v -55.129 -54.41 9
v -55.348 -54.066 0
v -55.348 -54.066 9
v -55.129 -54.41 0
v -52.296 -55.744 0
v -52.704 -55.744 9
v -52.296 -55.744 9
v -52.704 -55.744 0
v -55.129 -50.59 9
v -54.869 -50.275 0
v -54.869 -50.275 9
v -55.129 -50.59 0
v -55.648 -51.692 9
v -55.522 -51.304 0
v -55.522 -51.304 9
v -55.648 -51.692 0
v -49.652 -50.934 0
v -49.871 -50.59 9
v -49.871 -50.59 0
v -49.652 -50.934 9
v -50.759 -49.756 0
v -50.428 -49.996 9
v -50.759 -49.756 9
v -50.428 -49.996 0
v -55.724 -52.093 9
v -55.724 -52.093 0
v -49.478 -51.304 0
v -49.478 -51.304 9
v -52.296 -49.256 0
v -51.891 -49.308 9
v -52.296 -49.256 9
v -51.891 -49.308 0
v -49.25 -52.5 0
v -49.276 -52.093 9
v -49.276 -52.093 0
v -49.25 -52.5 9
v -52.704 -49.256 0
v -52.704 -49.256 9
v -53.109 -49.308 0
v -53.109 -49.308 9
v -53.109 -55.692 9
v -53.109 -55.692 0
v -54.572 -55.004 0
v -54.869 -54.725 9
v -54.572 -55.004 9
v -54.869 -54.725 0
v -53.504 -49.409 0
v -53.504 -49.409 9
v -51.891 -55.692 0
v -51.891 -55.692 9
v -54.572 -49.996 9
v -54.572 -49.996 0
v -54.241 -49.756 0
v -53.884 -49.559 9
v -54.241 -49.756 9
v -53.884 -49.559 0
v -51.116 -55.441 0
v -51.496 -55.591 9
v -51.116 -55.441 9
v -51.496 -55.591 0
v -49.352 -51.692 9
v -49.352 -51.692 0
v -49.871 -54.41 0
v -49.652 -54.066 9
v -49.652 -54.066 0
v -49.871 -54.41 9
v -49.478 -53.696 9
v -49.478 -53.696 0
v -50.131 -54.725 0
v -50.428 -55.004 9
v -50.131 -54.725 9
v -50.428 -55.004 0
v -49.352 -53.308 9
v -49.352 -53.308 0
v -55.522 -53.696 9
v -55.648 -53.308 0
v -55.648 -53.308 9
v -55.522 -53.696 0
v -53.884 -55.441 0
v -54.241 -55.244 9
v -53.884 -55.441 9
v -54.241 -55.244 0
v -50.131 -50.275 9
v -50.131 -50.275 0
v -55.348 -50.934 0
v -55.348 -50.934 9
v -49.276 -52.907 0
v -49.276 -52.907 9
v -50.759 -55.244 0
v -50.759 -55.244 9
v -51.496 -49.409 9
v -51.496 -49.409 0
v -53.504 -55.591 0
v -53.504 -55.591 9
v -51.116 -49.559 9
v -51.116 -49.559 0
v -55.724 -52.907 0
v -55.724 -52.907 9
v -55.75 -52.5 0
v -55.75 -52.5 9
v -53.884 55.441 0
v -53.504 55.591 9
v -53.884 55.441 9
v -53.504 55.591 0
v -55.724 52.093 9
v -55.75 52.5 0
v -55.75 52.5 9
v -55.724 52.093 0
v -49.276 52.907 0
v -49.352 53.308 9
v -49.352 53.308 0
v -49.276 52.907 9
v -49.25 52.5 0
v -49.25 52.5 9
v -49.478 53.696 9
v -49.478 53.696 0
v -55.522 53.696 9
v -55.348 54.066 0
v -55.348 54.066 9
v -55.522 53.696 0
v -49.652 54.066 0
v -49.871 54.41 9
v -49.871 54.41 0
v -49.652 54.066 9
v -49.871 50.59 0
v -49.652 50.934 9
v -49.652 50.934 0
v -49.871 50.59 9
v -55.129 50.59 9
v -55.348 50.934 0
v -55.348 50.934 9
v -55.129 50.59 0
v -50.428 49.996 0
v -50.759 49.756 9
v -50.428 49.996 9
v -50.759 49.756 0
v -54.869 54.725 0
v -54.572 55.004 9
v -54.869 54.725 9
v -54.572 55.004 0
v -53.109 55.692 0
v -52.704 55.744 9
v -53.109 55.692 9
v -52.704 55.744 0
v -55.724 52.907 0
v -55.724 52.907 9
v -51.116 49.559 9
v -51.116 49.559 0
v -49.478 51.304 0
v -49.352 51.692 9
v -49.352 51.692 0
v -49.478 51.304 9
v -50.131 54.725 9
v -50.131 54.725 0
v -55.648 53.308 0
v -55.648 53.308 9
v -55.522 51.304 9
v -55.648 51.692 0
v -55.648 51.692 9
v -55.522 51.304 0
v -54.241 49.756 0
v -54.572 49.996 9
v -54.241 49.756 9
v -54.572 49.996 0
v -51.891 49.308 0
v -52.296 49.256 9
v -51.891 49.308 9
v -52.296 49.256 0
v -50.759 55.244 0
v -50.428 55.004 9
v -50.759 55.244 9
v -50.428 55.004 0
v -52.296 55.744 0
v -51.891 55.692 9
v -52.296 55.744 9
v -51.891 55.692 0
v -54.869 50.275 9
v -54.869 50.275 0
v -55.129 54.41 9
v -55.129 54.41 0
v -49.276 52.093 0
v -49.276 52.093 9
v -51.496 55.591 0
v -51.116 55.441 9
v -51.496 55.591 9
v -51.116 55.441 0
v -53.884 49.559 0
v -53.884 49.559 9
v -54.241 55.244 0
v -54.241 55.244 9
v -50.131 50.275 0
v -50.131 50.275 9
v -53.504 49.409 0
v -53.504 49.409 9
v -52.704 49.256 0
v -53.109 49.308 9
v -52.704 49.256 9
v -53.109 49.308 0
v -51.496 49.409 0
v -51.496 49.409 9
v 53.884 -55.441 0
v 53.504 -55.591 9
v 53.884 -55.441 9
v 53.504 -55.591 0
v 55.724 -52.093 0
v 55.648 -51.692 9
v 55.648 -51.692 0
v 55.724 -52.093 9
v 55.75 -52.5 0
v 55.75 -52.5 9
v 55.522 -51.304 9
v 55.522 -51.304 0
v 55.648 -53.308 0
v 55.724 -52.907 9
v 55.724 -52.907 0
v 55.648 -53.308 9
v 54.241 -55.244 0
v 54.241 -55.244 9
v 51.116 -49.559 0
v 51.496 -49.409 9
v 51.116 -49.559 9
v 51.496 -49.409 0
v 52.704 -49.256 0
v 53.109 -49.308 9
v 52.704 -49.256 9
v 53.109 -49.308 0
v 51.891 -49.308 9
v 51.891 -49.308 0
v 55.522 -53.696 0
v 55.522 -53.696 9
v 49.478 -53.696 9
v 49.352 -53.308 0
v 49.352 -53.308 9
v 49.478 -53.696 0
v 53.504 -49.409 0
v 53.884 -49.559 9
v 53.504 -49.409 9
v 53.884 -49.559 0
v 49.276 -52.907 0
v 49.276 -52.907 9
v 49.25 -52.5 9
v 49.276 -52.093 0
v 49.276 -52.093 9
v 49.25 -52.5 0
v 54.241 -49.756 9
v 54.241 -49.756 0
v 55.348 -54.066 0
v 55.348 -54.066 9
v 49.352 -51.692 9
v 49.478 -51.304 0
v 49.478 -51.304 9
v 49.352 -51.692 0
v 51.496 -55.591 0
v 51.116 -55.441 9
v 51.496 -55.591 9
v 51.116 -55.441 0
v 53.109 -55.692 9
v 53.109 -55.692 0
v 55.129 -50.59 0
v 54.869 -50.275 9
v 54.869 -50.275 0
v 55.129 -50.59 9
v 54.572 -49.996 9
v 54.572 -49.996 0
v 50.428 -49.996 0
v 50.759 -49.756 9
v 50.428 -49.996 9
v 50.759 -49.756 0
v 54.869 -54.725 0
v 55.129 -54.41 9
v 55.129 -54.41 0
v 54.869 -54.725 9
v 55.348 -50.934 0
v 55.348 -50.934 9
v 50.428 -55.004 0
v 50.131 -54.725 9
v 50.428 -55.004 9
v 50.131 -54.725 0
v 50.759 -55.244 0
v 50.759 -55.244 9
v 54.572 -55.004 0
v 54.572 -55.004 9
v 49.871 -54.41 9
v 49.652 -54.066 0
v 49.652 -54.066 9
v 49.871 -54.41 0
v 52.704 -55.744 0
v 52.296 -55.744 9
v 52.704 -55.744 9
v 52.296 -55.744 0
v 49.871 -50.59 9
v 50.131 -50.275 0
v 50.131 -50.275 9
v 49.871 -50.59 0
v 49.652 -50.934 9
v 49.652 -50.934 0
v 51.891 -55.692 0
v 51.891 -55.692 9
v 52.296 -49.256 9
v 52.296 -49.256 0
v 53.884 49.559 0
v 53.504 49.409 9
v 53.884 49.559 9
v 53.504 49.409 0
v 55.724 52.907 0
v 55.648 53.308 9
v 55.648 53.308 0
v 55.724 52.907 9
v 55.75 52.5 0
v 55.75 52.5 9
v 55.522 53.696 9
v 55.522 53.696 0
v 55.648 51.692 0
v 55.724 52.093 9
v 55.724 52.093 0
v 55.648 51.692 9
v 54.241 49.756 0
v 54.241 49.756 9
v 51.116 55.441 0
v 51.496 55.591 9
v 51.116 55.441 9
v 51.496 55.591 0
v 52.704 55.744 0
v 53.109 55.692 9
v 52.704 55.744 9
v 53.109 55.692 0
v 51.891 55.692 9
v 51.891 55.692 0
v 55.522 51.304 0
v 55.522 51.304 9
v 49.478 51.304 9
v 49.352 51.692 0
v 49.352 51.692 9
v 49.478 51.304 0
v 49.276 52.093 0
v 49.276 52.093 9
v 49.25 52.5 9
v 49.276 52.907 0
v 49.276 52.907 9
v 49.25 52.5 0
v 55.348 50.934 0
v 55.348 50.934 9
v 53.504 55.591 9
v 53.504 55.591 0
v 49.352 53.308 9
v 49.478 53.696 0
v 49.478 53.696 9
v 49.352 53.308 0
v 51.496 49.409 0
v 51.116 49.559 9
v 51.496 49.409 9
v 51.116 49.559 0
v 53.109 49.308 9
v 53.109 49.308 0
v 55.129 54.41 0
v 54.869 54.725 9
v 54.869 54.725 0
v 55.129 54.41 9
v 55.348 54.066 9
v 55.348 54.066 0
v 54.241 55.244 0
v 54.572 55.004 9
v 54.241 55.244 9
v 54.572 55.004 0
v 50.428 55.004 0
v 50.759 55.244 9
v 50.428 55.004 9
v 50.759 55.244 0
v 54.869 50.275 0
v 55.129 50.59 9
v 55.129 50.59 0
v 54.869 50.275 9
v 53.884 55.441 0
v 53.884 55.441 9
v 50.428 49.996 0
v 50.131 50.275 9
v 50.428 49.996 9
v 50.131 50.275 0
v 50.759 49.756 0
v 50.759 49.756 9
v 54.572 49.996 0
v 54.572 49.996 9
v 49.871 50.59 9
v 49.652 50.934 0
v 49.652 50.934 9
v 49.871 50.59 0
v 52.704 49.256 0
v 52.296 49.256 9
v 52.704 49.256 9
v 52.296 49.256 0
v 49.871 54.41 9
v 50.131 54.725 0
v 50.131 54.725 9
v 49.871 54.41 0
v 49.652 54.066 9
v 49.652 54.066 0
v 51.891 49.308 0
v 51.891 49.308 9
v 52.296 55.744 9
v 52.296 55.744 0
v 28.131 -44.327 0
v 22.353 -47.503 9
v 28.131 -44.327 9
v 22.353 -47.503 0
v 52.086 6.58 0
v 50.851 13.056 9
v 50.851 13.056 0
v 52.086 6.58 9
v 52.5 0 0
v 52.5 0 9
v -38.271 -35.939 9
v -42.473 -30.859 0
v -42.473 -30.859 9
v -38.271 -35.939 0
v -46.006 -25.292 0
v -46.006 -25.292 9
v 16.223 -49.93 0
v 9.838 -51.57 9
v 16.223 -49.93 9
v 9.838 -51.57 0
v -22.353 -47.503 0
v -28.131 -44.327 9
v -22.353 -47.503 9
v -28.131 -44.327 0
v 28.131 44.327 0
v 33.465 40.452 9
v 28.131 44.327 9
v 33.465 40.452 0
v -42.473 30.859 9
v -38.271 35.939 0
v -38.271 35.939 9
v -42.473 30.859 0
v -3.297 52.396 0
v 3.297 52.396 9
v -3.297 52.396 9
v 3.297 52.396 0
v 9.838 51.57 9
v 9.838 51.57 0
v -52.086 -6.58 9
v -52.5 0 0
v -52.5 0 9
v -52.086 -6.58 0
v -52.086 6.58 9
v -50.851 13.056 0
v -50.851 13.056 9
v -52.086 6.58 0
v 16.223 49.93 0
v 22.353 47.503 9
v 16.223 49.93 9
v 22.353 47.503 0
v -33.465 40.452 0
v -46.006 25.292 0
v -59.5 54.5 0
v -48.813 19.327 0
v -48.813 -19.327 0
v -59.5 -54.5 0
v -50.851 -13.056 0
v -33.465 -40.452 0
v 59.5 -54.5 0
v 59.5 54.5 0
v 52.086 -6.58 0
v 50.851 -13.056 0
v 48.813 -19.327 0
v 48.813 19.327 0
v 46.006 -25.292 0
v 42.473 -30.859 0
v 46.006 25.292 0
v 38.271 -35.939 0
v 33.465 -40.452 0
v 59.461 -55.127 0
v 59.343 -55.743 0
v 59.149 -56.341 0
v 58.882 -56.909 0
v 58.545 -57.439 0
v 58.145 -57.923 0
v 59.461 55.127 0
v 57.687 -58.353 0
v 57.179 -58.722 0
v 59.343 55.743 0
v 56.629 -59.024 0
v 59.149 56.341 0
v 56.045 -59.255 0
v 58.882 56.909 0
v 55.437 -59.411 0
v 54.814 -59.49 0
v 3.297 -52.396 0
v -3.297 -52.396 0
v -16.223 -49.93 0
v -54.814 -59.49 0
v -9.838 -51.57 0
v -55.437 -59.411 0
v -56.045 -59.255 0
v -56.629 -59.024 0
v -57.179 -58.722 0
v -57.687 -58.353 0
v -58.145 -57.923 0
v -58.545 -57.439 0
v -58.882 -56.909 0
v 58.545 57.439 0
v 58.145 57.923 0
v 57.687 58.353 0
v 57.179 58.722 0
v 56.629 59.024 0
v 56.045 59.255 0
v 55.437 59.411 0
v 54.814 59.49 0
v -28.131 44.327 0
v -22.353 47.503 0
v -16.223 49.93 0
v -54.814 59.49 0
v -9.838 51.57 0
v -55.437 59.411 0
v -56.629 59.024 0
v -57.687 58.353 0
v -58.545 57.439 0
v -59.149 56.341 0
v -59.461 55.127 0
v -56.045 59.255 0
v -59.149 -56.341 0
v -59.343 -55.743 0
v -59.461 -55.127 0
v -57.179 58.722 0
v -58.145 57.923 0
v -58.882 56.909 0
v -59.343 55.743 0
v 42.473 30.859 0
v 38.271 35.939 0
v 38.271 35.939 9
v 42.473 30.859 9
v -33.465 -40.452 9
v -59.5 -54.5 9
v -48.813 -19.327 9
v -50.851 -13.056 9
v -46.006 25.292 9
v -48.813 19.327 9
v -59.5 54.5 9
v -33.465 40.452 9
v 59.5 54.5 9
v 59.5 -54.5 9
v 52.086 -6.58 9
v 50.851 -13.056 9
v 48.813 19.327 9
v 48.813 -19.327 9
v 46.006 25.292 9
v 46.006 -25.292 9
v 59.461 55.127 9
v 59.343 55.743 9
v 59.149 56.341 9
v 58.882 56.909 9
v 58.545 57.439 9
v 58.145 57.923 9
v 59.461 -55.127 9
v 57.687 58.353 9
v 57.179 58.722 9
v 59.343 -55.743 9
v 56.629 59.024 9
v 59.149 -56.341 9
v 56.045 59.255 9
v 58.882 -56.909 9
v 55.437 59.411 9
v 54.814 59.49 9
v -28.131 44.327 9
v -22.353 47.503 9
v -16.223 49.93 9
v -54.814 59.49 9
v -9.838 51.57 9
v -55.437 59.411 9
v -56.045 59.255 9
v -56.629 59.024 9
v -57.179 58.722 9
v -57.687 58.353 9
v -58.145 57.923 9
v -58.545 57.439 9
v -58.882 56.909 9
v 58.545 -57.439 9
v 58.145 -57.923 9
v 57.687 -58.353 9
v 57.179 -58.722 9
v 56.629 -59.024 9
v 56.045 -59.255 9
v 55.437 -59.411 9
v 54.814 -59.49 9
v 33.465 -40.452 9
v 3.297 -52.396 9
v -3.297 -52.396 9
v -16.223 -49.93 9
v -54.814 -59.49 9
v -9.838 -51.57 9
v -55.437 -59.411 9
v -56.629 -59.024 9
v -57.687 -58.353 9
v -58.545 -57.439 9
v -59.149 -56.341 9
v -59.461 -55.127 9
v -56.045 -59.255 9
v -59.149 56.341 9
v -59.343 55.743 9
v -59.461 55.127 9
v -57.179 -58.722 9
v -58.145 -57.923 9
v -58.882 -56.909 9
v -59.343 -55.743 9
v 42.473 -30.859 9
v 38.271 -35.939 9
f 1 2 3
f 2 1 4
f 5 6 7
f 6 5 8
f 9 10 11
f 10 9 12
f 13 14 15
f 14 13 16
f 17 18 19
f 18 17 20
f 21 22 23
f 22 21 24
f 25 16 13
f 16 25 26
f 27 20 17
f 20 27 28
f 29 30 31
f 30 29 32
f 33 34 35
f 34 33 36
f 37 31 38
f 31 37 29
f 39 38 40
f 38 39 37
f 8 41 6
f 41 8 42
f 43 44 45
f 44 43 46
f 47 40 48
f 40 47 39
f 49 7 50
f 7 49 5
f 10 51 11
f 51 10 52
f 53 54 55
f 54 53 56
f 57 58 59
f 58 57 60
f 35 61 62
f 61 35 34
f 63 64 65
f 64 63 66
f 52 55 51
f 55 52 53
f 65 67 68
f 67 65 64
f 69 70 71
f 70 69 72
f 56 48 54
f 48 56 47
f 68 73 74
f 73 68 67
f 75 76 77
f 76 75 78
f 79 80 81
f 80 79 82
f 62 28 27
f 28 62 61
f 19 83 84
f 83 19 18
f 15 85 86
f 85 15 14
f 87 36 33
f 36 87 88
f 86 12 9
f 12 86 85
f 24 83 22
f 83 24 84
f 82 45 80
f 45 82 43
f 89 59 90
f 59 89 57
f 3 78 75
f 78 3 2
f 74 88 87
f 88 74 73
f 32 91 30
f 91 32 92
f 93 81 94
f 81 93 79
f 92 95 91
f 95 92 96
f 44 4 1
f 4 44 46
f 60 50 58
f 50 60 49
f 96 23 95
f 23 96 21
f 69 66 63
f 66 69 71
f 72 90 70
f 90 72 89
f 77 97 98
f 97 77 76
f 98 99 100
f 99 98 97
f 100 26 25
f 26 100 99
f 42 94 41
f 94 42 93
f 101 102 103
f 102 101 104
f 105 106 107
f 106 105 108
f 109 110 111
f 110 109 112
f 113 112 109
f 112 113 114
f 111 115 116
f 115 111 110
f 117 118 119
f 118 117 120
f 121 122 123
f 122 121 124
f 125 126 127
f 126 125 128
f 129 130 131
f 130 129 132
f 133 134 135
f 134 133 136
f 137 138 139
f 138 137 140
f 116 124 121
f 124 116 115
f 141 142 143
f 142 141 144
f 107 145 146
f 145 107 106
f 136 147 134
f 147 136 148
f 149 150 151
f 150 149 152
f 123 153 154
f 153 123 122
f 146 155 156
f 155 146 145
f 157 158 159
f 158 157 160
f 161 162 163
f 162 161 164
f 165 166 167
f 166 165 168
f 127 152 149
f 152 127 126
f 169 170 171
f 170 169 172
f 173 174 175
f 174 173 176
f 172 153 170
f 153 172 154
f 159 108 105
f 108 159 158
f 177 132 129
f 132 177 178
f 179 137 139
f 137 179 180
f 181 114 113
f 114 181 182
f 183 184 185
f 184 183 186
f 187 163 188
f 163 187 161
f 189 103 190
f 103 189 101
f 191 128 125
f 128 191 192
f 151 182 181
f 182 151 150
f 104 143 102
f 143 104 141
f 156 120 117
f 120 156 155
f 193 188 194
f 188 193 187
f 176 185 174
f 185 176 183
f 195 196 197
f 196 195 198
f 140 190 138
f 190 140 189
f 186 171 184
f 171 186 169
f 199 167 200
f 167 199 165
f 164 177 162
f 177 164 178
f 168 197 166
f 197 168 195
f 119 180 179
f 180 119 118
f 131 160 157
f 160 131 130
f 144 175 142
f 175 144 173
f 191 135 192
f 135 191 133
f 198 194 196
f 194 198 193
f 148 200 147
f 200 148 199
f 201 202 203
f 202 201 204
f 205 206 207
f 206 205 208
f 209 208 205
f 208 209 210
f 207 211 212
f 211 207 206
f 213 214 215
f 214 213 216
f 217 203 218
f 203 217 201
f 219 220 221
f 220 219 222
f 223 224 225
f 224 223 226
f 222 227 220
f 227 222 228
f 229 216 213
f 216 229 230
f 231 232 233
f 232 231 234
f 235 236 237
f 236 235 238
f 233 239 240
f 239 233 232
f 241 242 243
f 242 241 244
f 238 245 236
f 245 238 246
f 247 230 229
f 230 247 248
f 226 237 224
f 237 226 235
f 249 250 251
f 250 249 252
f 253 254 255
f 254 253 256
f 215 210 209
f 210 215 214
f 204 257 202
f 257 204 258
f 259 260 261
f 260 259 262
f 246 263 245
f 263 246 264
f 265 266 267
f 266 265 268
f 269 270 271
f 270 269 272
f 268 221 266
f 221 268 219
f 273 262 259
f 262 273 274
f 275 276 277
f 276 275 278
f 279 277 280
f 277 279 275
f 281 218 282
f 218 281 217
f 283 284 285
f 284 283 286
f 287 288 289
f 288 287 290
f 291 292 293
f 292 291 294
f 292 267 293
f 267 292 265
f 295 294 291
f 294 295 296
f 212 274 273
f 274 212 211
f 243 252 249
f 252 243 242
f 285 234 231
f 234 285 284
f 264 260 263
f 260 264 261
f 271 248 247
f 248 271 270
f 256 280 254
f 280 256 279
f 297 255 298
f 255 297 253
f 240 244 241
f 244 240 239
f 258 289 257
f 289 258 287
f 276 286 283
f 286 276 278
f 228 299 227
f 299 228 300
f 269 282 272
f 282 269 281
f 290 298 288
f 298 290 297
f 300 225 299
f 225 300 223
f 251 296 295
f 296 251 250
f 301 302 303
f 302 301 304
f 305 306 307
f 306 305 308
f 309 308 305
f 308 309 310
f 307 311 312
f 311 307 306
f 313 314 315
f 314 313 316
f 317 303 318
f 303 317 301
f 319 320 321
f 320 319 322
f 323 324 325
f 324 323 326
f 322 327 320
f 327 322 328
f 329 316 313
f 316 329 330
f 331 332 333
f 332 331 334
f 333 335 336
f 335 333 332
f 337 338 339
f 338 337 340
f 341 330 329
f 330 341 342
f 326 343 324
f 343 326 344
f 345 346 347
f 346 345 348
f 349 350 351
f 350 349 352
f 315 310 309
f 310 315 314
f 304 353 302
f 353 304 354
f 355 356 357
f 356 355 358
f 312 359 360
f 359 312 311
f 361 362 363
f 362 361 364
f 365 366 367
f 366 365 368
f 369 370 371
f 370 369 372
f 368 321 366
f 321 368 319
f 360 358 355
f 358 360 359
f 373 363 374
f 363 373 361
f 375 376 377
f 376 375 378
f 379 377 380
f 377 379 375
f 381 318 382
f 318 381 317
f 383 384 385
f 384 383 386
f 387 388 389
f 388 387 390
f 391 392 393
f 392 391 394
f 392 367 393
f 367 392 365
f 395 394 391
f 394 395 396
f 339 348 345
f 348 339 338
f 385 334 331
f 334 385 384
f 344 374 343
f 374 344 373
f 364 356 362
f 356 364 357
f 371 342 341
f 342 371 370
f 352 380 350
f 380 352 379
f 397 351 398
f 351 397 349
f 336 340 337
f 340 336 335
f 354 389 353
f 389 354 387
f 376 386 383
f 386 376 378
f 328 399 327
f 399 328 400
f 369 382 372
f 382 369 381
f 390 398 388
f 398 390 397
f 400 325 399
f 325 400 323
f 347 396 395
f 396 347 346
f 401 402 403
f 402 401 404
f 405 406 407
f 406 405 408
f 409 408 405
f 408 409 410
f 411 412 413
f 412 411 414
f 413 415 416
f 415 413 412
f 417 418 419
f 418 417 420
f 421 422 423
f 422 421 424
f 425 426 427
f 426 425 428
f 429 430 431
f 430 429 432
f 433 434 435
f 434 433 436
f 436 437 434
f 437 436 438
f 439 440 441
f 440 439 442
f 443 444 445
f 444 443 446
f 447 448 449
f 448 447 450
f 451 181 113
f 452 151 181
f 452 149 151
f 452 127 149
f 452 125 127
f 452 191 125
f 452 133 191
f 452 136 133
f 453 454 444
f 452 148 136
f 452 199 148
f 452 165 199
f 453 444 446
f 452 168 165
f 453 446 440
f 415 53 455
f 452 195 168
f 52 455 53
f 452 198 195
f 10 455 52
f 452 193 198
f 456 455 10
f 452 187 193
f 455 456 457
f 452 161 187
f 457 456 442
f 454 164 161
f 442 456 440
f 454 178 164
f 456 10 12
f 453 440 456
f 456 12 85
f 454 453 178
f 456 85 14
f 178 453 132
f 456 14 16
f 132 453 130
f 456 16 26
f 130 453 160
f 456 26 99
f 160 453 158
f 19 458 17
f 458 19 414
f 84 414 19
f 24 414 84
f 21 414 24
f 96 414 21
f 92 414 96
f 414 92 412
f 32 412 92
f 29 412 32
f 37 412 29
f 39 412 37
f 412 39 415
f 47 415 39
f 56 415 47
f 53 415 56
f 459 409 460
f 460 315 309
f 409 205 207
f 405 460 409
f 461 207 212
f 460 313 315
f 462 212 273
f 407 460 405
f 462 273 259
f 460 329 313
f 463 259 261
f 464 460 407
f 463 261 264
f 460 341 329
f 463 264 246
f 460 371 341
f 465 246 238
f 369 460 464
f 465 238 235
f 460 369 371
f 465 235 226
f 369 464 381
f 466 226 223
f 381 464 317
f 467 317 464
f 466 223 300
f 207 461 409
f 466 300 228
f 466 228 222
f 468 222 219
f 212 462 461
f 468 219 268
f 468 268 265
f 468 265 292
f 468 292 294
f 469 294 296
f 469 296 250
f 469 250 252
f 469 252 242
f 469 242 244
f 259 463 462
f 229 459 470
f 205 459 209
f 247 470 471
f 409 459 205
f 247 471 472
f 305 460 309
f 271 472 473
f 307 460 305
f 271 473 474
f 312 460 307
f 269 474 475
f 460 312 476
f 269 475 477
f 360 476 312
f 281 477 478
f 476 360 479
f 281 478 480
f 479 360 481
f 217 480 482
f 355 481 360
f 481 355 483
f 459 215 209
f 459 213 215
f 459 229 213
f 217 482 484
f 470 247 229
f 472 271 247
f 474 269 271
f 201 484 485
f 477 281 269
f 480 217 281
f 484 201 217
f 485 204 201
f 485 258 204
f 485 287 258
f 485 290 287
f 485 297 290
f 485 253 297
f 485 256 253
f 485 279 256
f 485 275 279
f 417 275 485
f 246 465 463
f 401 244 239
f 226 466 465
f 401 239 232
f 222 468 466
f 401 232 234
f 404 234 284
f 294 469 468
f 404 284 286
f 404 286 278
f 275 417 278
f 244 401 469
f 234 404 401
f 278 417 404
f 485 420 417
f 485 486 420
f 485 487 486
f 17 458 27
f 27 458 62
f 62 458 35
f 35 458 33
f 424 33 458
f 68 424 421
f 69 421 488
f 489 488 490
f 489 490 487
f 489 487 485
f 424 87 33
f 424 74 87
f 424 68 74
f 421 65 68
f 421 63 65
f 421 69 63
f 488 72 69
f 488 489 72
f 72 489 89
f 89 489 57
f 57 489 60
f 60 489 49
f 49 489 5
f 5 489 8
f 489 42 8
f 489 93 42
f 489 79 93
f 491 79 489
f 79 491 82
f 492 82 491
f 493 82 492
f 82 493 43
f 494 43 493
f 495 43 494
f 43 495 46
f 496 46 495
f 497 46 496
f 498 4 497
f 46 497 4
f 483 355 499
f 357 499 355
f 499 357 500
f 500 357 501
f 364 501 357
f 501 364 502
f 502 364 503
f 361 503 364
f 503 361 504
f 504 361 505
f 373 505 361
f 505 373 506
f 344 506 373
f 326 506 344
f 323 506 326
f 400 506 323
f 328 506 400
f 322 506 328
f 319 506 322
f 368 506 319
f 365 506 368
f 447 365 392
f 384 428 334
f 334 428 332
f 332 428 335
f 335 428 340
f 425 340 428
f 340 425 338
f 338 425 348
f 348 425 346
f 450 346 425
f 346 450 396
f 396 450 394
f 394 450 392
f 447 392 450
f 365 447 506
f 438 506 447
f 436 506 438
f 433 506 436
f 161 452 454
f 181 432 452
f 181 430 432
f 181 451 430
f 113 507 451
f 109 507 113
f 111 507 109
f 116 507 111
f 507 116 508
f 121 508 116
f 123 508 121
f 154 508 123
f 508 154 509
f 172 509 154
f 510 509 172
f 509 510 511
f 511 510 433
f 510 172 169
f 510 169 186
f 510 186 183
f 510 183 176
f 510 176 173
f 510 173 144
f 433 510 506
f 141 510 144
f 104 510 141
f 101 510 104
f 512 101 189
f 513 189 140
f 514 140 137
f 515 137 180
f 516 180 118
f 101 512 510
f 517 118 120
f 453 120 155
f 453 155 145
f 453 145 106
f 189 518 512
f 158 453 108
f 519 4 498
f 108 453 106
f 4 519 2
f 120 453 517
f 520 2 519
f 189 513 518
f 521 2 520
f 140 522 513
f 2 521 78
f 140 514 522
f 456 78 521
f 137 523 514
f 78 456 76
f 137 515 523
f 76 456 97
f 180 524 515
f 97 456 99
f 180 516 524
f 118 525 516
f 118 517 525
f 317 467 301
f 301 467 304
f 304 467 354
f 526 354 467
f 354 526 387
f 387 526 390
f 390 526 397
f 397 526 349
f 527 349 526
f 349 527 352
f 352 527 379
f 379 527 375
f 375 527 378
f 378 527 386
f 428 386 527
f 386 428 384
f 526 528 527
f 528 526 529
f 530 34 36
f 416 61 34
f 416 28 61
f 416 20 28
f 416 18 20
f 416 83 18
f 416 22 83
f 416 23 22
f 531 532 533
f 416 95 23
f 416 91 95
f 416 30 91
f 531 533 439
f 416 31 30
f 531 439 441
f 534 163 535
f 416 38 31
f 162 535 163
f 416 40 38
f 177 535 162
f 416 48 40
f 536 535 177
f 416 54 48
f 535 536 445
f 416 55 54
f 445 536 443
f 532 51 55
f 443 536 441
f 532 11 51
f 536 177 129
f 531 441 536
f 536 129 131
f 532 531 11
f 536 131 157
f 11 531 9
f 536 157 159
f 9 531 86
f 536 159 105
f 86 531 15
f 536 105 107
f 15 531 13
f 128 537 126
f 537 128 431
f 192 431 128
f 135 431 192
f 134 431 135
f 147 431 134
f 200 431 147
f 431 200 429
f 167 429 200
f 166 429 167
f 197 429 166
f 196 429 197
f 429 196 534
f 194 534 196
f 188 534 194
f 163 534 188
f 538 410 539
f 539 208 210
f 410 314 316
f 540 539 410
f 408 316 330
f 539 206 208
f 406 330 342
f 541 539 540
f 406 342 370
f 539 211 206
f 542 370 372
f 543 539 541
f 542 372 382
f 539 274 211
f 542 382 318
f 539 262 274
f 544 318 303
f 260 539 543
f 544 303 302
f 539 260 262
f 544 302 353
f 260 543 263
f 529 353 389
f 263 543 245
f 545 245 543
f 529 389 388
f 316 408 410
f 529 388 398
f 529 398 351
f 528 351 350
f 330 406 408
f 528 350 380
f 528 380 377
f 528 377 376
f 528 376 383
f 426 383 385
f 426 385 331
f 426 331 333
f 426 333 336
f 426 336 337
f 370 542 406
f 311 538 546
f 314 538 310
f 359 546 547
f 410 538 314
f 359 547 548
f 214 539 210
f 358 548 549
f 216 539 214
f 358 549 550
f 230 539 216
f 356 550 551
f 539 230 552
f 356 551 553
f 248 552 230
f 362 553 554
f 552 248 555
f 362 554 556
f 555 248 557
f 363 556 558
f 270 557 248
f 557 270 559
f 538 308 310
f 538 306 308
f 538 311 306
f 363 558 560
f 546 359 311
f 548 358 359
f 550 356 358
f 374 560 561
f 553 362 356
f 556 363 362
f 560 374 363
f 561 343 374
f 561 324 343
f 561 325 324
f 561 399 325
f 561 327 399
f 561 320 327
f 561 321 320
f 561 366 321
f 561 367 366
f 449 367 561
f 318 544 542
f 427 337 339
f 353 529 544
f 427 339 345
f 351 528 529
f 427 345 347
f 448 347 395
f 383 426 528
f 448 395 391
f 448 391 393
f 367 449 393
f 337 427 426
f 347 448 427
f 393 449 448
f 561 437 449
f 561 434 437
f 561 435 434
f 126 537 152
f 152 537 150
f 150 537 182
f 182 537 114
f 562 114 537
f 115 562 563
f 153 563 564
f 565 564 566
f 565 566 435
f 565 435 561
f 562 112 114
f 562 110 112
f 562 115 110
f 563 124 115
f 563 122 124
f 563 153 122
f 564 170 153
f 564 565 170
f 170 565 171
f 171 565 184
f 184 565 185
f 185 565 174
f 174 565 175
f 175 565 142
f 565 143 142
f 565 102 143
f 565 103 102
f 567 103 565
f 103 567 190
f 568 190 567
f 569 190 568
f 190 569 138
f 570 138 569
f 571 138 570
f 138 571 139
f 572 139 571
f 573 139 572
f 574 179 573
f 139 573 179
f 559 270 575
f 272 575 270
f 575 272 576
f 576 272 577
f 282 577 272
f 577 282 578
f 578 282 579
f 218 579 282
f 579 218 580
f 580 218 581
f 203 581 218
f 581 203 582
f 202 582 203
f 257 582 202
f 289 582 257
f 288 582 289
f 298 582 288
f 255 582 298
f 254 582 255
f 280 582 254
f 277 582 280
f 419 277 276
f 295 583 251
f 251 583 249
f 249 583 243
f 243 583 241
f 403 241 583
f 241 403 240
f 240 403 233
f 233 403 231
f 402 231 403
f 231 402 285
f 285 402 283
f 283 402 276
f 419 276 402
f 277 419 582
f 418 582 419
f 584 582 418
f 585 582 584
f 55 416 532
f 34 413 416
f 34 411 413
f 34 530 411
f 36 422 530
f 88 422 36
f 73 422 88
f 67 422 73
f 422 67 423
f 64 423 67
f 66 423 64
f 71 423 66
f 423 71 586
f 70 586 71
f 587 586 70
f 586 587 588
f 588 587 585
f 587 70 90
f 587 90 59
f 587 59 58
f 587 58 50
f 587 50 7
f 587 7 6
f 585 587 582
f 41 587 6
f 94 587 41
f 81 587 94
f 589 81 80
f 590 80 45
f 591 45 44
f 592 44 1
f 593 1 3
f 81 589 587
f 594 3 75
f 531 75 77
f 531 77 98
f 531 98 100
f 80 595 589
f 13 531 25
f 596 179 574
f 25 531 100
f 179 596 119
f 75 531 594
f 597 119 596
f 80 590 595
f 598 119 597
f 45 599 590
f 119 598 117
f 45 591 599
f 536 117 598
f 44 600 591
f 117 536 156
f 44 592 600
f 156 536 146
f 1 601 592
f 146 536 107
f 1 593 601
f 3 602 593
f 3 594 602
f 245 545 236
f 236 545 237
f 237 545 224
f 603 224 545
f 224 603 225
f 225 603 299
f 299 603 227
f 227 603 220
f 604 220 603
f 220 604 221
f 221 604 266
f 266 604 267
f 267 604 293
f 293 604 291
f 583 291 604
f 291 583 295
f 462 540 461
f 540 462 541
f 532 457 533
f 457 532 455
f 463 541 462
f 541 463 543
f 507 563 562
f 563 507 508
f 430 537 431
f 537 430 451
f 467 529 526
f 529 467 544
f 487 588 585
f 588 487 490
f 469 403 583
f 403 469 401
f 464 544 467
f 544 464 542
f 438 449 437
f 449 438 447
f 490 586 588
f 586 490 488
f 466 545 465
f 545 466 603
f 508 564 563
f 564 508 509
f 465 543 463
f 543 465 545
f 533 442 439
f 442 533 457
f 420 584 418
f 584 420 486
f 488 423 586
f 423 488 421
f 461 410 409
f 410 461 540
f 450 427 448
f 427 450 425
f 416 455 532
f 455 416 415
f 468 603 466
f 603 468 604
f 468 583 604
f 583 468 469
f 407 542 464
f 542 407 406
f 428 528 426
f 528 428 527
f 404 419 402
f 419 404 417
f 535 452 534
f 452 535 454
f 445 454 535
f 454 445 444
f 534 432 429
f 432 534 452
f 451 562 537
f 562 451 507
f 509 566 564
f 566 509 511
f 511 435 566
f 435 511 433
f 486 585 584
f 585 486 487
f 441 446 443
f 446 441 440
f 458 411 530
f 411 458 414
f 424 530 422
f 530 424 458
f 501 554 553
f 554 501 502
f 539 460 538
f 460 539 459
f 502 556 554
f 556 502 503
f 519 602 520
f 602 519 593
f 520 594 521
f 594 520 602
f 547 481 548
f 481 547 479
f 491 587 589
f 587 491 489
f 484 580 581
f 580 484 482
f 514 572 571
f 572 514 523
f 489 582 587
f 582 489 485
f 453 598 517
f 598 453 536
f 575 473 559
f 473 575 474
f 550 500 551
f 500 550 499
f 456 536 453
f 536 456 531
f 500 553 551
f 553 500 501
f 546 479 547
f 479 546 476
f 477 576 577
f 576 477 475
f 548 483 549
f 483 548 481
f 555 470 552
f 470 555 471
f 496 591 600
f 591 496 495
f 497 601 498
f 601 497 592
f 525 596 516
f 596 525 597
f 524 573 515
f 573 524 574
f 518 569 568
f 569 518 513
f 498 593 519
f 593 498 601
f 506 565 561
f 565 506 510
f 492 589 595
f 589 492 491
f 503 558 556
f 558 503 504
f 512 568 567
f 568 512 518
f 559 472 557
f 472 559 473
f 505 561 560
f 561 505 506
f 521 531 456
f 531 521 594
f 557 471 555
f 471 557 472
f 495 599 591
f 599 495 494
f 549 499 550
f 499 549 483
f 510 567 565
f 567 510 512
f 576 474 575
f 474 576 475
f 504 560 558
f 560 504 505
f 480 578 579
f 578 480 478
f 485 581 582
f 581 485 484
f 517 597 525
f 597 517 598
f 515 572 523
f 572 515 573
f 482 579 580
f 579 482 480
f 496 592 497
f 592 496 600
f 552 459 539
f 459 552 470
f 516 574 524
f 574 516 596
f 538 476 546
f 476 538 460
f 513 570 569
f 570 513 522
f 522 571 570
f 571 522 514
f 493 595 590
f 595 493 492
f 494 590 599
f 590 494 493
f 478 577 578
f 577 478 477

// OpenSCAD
$fn = 50;


difference() {
	union() {
		hull() {
			translate(v = [-54.5000000000, 54.5000000000, 0]) {
				cylinder(h = 9, r = 5);
			}
			translate(v = [54.5000000000, 54.5000000000, 0]) {
				cylinder(h = 9, r = 5);
			}
			translate(v = [-54.5000000000, -54.5000000000, 0]) {
				cylinder(h = 9, r = 5);
			}
			translate(v = [54.5000000000, -54.5000000000, 0]) {
				cylinder(h = 9, r = 5);
			}
		}
	}
	union() {
		#translate(v = [-52.5000000000, -52.5000000000, -100.0000000000]) {
			cylinder(h = 200, r = 3.2500000000);
		}
		#translate(v = [-52.5000000000, 52.5000000000, -100.0000000000]) {
			cylinder(h = 200, r = 3.2500000000);
		}
		#translate(v = [52.5000000000, -52.5000000000, -100.0000000000]) {
			cylinder(h = 200, r = 3.2500000000);
		}
		#translate(v = [52.5000000000, 52.5000000000, -100.0000000000]) {
			cylinder(h = 200, r = 3.2500000000);
		}
		#cylinder(h = 9, r = 52.5000000000);
	}
}
